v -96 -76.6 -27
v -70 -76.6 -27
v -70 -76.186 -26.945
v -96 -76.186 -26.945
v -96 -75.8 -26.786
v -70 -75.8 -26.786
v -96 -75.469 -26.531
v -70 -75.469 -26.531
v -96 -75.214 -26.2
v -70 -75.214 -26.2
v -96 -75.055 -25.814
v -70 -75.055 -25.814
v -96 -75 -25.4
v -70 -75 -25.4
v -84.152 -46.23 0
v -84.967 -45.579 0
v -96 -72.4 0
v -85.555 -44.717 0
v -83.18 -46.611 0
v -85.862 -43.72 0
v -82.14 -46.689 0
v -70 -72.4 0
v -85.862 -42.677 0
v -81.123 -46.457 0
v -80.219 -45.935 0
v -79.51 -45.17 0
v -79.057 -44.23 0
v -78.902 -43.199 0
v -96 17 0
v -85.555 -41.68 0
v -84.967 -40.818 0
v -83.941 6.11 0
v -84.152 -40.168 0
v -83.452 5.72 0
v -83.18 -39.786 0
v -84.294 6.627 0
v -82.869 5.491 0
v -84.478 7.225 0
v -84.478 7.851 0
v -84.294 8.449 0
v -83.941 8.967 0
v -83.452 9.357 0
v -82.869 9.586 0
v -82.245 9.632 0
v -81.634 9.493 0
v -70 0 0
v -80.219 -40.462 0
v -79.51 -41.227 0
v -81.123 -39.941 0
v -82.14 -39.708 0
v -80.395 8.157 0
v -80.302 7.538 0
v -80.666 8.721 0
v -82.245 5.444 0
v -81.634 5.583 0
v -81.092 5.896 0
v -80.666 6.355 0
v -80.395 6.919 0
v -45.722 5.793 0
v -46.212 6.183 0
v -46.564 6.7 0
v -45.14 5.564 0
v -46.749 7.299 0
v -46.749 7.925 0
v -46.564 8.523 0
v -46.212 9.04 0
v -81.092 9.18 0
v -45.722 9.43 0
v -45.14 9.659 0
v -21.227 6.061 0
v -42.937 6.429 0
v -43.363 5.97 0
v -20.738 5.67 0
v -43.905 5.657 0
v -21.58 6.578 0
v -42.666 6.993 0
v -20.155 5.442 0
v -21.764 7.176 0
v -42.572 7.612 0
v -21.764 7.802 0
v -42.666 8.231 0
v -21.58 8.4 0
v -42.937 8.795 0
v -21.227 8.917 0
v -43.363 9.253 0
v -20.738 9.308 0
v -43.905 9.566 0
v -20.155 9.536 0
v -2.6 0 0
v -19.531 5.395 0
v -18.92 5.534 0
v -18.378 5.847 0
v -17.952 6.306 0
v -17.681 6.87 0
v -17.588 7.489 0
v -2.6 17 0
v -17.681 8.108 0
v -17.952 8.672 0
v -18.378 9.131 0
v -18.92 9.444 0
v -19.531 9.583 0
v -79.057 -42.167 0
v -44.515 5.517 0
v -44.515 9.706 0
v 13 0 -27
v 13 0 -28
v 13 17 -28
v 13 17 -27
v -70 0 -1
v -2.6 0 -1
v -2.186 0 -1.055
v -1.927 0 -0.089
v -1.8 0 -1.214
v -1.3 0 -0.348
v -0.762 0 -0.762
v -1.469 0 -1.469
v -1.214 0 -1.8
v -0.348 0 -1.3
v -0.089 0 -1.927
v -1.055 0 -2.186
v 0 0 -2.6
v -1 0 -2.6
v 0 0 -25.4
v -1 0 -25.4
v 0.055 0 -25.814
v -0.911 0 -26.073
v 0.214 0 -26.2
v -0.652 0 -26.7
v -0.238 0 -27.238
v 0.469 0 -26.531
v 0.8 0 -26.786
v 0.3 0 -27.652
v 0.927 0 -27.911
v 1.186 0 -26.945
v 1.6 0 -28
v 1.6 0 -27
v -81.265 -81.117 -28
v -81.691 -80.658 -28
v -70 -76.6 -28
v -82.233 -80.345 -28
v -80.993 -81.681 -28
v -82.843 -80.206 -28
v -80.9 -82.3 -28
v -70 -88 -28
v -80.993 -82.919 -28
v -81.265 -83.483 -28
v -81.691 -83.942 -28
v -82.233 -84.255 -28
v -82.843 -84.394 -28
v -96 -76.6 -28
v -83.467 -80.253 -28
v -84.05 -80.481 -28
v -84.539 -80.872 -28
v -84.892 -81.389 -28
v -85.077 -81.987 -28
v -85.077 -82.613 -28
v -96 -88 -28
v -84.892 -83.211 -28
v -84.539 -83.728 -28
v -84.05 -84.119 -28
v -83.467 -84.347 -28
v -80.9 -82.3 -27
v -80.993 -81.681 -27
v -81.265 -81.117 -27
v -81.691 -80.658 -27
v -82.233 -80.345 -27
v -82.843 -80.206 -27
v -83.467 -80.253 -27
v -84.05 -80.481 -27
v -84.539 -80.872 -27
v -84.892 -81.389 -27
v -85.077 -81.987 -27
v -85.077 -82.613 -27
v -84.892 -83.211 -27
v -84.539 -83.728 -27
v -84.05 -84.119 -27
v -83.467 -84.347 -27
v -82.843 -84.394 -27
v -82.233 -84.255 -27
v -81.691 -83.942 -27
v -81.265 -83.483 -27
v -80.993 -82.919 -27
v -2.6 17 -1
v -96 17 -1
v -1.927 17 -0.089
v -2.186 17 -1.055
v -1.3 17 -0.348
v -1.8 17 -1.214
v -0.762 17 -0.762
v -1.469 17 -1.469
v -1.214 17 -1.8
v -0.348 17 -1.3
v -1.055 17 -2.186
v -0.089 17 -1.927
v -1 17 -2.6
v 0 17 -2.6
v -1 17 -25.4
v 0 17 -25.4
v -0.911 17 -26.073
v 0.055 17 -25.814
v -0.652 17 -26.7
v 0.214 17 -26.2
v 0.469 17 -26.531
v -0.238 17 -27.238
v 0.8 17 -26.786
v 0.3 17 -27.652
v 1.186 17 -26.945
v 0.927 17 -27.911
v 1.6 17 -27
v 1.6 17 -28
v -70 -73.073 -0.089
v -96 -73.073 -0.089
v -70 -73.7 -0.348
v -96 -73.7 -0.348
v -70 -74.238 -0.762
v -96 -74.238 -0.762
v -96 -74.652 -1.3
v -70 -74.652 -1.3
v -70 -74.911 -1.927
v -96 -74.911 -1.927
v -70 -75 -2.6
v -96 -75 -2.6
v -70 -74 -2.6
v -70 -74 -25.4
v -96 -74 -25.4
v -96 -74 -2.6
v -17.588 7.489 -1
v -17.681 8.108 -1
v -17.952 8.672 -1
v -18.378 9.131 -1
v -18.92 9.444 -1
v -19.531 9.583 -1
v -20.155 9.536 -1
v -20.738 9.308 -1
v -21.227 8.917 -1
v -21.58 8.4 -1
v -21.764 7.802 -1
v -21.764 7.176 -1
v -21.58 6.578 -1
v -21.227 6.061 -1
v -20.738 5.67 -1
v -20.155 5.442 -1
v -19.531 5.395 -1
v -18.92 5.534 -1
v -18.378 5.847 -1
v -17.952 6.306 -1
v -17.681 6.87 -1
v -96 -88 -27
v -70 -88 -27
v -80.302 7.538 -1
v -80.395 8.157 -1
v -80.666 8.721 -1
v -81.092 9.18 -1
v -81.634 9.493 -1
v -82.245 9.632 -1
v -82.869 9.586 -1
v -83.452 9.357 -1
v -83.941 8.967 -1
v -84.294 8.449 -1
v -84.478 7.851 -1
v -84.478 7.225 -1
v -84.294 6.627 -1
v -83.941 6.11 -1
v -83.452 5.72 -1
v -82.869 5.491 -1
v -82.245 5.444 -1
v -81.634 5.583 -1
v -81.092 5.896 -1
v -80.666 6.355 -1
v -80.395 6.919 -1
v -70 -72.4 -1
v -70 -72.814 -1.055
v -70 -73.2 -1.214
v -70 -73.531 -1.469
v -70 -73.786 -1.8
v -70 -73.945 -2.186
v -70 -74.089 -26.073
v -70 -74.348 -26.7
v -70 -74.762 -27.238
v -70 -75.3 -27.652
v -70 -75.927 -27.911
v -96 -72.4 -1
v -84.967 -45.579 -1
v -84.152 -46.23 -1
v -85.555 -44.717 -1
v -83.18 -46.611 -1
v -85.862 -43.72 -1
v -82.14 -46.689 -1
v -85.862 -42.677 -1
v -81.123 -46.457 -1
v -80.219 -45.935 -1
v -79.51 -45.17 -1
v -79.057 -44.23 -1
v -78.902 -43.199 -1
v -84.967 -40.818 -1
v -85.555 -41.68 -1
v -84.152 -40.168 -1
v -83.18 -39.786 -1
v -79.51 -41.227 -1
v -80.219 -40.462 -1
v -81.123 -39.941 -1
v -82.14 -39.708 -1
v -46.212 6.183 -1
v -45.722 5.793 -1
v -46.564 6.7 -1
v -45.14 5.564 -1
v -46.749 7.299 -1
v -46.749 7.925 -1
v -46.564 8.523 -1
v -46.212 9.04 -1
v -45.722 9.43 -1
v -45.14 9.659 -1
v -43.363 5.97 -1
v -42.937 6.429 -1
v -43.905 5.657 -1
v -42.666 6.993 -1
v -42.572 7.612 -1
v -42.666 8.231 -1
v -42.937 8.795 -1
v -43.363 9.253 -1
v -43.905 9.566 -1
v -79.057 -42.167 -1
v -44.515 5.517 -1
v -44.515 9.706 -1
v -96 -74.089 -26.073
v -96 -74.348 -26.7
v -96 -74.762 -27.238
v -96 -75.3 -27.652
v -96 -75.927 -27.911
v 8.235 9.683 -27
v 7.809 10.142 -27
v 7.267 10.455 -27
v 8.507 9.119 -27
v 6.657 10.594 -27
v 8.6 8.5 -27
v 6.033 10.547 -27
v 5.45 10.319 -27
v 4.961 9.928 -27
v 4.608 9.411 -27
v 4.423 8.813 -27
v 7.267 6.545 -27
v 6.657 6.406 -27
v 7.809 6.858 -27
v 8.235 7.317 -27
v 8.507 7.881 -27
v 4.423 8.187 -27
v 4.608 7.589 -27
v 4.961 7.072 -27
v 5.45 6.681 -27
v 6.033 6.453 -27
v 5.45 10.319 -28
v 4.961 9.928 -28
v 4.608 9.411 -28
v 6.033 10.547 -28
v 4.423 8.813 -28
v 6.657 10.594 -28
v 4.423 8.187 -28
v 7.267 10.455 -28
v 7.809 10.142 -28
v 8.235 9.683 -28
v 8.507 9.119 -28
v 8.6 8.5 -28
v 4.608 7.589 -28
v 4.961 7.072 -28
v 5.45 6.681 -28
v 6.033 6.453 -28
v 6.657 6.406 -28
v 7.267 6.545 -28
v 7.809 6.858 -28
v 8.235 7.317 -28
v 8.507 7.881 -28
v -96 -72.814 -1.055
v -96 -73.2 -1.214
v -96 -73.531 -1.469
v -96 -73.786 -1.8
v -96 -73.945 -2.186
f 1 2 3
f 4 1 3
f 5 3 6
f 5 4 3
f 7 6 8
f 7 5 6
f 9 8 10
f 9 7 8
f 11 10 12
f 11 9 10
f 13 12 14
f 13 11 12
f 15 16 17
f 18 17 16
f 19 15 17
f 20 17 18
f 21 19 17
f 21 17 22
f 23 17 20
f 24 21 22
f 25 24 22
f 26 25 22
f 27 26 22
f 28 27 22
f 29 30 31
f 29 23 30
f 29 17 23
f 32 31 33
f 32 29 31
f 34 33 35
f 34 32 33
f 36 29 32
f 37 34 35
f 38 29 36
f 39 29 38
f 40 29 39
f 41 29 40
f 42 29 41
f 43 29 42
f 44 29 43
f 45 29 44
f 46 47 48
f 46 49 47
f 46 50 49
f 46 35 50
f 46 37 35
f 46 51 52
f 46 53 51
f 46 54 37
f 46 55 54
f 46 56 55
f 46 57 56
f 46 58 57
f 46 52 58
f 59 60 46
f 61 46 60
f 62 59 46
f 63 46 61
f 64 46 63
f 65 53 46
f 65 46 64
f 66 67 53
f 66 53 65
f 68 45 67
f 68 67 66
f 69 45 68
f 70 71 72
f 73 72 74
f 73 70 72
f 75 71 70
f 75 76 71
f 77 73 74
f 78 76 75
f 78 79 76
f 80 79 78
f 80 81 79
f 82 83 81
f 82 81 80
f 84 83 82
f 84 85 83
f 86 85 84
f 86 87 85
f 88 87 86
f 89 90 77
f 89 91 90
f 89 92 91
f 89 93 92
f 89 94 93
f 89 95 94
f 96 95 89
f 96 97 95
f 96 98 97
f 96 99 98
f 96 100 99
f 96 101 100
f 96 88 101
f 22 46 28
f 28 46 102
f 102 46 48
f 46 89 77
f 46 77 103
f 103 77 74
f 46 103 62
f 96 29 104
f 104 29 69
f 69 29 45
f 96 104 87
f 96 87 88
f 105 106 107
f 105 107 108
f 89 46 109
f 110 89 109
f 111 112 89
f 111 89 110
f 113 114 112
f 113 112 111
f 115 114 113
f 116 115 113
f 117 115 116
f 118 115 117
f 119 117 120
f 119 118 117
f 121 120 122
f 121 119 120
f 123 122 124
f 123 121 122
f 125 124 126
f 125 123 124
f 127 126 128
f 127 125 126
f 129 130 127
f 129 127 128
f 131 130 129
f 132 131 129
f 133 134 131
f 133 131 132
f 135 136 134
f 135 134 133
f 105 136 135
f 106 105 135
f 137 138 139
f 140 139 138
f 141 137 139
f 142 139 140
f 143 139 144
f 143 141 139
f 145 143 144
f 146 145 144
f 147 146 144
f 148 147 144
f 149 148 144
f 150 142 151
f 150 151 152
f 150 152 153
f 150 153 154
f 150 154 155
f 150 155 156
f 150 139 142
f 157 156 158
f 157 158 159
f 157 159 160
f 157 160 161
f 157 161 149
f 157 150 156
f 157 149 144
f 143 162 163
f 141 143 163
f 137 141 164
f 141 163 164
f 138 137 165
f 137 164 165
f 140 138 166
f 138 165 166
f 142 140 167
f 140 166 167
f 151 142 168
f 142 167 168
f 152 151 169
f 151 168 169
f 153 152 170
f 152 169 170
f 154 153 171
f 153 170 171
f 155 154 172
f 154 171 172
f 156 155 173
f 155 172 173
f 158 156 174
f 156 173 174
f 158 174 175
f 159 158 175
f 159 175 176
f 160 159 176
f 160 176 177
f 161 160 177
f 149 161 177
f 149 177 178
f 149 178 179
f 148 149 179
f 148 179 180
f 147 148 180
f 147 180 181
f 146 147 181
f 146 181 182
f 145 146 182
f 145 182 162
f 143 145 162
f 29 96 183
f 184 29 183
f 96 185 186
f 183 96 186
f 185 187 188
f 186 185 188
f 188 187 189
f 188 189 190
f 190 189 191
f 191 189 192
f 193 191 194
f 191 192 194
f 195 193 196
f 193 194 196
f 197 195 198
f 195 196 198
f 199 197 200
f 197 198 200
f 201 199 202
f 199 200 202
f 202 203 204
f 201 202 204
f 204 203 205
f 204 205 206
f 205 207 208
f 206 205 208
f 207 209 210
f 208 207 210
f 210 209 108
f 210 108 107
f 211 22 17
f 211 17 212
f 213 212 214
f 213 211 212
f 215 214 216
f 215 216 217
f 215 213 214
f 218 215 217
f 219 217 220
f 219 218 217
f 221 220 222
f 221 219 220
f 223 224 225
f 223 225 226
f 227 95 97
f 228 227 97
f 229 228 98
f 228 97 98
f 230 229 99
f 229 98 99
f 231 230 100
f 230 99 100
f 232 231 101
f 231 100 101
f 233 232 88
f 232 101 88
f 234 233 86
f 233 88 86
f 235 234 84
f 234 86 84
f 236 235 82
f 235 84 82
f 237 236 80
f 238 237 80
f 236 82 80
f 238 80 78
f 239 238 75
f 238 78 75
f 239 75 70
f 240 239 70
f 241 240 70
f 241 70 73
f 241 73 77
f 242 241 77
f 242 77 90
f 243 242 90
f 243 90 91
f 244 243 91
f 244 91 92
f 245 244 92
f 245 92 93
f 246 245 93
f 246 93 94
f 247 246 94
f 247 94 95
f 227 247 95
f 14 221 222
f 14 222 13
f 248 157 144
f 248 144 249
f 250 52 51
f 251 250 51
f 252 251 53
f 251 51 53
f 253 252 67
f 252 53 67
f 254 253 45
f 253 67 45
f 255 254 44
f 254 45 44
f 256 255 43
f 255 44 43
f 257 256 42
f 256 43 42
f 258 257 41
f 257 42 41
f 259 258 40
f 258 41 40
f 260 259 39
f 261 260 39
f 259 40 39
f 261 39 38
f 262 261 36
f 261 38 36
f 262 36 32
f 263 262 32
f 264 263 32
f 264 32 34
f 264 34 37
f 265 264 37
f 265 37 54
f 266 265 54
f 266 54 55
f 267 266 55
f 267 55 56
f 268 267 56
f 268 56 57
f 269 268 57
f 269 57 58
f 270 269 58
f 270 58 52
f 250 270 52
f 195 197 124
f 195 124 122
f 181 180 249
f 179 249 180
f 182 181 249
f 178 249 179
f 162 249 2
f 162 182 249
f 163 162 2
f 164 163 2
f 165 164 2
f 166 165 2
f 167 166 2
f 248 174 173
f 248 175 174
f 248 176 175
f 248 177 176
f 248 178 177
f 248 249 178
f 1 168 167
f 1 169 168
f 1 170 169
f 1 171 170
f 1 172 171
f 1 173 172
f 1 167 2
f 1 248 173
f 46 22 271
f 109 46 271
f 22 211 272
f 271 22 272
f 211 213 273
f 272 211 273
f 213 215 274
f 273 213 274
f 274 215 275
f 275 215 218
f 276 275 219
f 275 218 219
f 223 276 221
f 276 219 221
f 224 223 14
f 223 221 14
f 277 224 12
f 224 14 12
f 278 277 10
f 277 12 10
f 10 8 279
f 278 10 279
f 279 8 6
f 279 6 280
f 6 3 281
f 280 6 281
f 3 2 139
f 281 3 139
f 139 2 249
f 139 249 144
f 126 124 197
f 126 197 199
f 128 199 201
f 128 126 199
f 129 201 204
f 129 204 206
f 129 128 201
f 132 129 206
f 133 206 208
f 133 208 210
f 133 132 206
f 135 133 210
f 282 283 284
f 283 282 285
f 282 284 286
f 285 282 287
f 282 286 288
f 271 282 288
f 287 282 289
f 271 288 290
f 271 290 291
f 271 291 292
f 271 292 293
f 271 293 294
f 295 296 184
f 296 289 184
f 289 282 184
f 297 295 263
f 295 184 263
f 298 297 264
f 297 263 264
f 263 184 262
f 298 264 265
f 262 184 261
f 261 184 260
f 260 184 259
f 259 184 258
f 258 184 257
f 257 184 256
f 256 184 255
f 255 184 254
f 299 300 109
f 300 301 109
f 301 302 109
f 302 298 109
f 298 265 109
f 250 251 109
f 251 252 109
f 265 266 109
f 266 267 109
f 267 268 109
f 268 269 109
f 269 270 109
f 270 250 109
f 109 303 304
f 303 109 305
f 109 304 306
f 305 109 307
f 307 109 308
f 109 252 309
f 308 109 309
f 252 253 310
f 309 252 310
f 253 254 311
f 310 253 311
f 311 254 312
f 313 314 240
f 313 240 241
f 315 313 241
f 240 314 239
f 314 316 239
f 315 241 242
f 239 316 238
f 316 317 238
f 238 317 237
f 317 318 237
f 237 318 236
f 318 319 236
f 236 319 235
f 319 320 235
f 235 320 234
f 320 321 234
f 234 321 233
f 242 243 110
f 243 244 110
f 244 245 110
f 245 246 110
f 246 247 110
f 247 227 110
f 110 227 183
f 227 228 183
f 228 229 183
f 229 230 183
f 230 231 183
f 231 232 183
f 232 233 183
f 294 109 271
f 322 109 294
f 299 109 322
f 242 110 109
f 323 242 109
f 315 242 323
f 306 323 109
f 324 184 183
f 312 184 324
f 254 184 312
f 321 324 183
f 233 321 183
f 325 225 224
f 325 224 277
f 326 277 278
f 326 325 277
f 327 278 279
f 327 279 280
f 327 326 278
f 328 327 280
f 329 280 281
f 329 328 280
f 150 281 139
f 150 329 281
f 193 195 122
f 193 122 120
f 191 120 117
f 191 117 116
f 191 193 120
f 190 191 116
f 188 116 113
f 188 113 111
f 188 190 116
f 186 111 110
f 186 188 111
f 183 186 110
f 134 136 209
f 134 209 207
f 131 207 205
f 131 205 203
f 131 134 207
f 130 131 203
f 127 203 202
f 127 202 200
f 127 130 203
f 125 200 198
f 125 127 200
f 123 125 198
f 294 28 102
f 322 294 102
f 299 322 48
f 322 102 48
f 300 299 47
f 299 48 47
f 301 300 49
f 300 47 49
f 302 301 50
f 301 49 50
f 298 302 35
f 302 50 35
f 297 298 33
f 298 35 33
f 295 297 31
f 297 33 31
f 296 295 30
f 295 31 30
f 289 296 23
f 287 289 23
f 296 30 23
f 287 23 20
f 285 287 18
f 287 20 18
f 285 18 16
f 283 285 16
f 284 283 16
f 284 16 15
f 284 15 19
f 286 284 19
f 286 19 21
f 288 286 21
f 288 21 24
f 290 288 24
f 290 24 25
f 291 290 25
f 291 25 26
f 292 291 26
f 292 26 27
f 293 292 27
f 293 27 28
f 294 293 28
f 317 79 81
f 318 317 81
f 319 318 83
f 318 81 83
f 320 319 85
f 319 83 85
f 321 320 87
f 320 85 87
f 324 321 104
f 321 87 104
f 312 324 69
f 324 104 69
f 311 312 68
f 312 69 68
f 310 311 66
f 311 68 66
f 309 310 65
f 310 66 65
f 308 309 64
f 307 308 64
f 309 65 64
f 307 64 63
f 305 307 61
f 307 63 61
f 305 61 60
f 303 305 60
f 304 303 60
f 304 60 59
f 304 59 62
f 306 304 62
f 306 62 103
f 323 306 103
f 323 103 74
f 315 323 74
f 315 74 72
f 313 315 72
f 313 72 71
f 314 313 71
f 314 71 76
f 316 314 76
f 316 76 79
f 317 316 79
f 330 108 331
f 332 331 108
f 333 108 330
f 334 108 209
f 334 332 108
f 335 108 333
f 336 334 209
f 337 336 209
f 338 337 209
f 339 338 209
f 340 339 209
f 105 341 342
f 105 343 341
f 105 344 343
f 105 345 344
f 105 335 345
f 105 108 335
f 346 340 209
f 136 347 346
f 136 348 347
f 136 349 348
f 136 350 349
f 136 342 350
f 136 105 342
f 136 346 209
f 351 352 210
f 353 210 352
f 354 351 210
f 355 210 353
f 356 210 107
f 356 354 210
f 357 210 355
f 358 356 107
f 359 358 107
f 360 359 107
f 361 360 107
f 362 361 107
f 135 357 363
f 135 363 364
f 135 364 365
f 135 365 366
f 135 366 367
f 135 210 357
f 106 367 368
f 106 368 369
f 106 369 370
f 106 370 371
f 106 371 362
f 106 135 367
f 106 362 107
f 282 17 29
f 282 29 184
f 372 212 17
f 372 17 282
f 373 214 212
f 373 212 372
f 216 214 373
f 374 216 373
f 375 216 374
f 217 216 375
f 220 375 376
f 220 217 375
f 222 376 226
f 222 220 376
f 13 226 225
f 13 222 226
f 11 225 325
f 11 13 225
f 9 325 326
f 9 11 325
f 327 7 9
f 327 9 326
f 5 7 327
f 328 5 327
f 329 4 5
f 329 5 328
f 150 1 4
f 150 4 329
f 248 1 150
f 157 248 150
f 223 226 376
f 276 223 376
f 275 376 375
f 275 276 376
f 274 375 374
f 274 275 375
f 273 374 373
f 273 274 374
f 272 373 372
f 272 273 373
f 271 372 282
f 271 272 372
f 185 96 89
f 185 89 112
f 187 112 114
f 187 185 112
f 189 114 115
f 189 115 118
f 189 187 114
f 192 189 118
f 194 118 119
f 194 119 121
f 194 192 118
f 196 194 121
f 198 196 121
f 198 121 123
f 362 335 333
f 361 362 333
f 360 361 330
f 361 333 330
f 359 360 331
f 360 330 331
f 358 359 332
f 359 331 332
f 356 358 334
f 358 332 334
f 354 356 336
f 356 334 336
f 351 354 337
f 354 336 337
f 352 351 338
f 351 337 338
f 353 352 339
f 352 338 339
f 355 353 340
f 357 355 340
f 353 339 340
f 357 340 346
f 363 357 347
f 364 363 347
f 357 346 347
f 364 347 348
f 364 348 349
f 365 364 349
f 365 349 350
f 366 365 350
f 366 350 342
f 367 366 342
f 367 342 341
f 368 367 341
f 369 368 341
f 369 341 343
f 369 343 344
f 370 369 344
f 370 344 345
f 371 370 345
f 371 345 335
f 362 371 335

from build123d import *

# Parameters (mm, degrees)
BASE_FLANGE1_DEPTH           = 1
EDGE_FLANGE1_STRIP_W         = 7.2
EDGE_FLANGE1_STRIP_H         = 1
EDGE_FLANGE1_STRIP_CUT_DEPTH = 17
EDGE_FLANGE1_DEPTH           = 17
EDGE_FLANGE2_STRIP_W         = 7.2
EDGE_FLANGE2_STRIP_H         = 1
EDGE_FLANGE2_STRIP_CUT_DEPTH = 17
EDGE_FLANGE2_DEPTH           = 17
EDGE_FLANGE3_STRIP_W         = 7.2
EDGE_FLANGE3_STRIP_H         = 1
EDGE_FLANGE3_STRIP_CUT_DEPTH = 26
EDGE_FLANGE3_DEPTH           = 26
EDGE_FLANGE4_STRIP_W         = 7.2
EDGE_FLANGE4_STRIP_H         = 1
EDGE_FLANGE4_STRIP_CUT_DEPTH = 26
EDGE_FLANGE4_DEPTH           = 26
SKETCH18_R                   = 2.1
CUT_EXTRUDE1_DEPTH           = 6
SKETCH19_R                   = 2.1
CUT_EXTRUDE2_DEPTH           = 40
SKETCH20_R                   = 3.5
CUT_EXTRUDE3_DEPTH           = 40


# Sheet-metal steps are written as plain solids
with BuildPart() as part:
    # Sketch1 → Base-Flange1 (new body)
    with BuildSketch(Plane.XY):
        Polygon((0, 0), (0, 17), (-96, 17), (-96, -75), (-70, -75), (-70, 0), align=None)
    extrude(amount=-BASE_FLANGE1_DEPTH)

    # Edge-Flange1 strip (across the edge) → Edge-Flange1 strip cut (cut)
    with BuildSketch(Plane(origin=(0, 17, -1), x_dir=(-1, 0, 0), z_dir=(0, -1, 0))):
        with Locations((-1, -0.5)):
            Rectangle(EDGE_FLANGE1_STRIP_W, EDGE_FLANGE1_STRIP_H)
    extrude(amount=EDGE_FLANGE1_STRIP_CUT_DEPTH, mode=Mode.SUBTRACT)

    # Edge-Flange1 section (across the edge) → Edge-Flange1 (add)
    with BuildSketch(Plane(origin=(0, 17, -1), x_dir=(-1, 0, 0), z_dir=(0, -1, 0))):
        with BuildLine():
            Line((0, 1.6), (0, 27))
            Line((0, 27), (1, 27))
            Line((1, 27), (1, 1.6))
            ThreePointArc((1, 1.6), (1.46862915, 0.46862915), (2.6, 0))
            Line((2.6, 0), (2.6, -1))
            ThreePointArc((2.6, -1), (0.761522369, -0.238477631), (0, 1.6))
        make_face()
    extrude(amount=EDGE_FLANGE1_DEPTH)

    # Edge-Flange2 strip (across the edge) → Edge-Flange2 strip cut (cut)
    with BuildSketch(Plane(origin=(0, 0, -28), x_dir=(0, 0, 1), z_dir=(0, 1, 0))):
        with Locations((-1, -0.5)):
            Rectangle(EDGE_FLANGE2_STRIP_W, EDGE_FLANGE2_STRIP_H)
    extrude(amount=EDGE_FLANGE2_STRIP_CUT_DEPTH, mode=Mode.SUBTRACT)

    # Edge-Flange2 section (across the edge) → Edge-Flange2 (add)
    with BuildSketch(Plane(origin=(0, 0, -28), x_dir=(0, 0, 1), z_dir=(0, 1, 0))):
        with BuildLine():
            Line((0, 1.6), (0, 13))
            Line((0, 13), (1, 13))
            Line((1, 13), (1, 1.6))
            ThreePointArc((1, 1.6), (1.46862915, 0.46862915), (2.6, 0))
            Line((2.6, 0), (2.6, -1))
            ThreePointArc((2.6, -1), (0.761522369, -0.238477631), (0, 1.6))
        make_face()
    extrude(amount=EDGE_FLANGE2_DEPTH)

    # Edge-Flange3 strip (across the edge) → Edge-Flange3 strip cut (cut)
    with BuildSketch(Plane(origin=(-70, -75, -1), x_dir=(0, 1, 0), z_dir=(-1, 0, 0))):
        with Locations((-1, -0.5)):
            Rectangle(EDGE_FLANGE3_STRIP_W, EDGE_FLANGE3_STRIP_H)
    extrude(amount=EDGE_FLANGE3_STRIP_CUT_DEPTH, mode=Mode.SUBTRACT)

    # Edge-Flange3 section (across the edge) → Edge-Flange3 (add)
    with BuildSketch(Plane(origin=(-70, -75, -1), x_dir=(0, 1, 0), z_dir=(-1, 0, 0))):
        with BuildLine():
            Line((0, 1.6), (0, 27))
            Line((0, 27), (1, 27))
            Line((1, 27), (1, 1.6))
            ThreePointArc((1, 1.6), (1.46862915, 0.46862915), (2.6, 0))
            Line((2.6, 0), (2.6, -1))
            ThreePointArc((2.6, -1), (0.761522369, -0.238477631), (0, 1.6))
        make_face()
    extrude(amount=EDGE_FLANGE3_DEPTH)

    # Edge-Flange4 strip (across the edge) → Edge-Flange4 strip cut (cut)
    with BuildSketch(Plane(origin=(-96, -75, -28), x_dir=(0, 0, 1), z_dir=(1, 0, 0))):
        with Locations((-1, -0.5)):
            Rectangle(EDGE_FLANGE4_STRIP_W, EDGE_FLANGE4_STRIP_H)
    extrude(amount=EDGE_FLANGE4_STRIP_CUT_DEPTH, mode=Mode.SUBTRACT)

    # Edge-Flange4 section (across the edge) → Edge-Flange4 (add)
    with BuildSketch(Plane(origin=(-96, -75, -28), x_dir=(0, 0, 1), z_dir=(1, 0, 0))):
        with BuildLine():
            Line((0, 1.6), (0, 13))
            Line((0, 13), (1, 13))
            Line((1, 13), (1, 1.6))
            ThreePointArc((1, 1.6), (1.46862915, 0.46862915), (2.6, 0))
            Line((2.6, 0), (2.6, -1))
            ThreePointArc((2.6, -1), (0.761522369, -0.238477631), (0, 1.6))
        make_face()
    extrude(amount=EDGE_FLANGE4_DEPTH)

    # Sketch18 → Cut-Extrude1 (cut)
    with BuildSketch(Plane.XY.offset(-27)):
        with Locations((6.5, 8.5)):
            Circle(SKETCH18_R)
    extrude(amount=-CUT_EXTRUDE1_DEPTH, mode=Mode.SUBTRACT)

    # Sketch19 → Cut-Extrude2 (cut)
    with BuildSketch(Plane.XY):
        with Locations((-44.672390486, 7.611585351)):
            Circle(SKETCH19_R)
        with Locations((-82.401549953, 7.538197483)):
            Circle(SKETCH19_R)
        with Locations((-83, -82.3)):
            Circle(SKETCH19_R)
        with Locations((-19.687589167, 7.489085351)):
            Circle(SKETCH19_R)
    extrude(amount=-CUT_EXTRUDE2_DEPTH, mode=Mode.SUBTRACT)

    # Sketch20 → Cut-Extrude3 (cut)
    with BuildSketch(Plane.XY):
        with Locations((-82.401549953, -43.198683771)):
            Circle(SKETCH20_R)
    extrude(amount=-CUT_EXTRUDE3_DEPTH, mode=Mode.SUBTRACT)


solid = part.part
